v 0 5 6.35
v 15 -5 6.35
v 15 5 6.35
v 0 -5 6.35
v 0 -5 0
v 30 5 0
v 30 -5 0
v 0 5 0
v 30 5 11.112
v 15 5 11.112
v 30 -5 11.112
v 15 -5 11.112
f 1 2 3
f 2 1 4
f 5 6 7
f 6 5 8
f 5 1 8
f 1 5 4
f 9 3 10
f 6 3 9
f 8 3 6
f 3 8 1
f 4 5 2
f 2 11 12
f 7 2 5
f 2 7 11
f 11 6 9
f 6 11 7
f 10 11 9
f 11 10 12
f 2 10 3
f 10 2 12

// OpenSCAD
// file: ../lib/common.scad
// Shared helpers for the AR turntable part models.
//
// Every part file holds a parameter table P. Each row is:
//   [id, description, value_mm, evidence, display_unit, source_or_how_to_check]
//
// Evidence codes:
//   F  factory document          O  owner report
//   C  community drawing         S  industry standard
//   D  design choice             M  measured for this repository
//   DV derived from cited sources, not yet verified on a part. The source
//      column holds the derivation: the formula, each input with its source,
//      and how to verify. Drawn in blue. Needs a row in TO-CONFIRM.md whose
//      value starts with "Derived:". Change to M once measured.
//   PH placeholder: chosen only so the model has a shape. It is NOT a
//      measurement. Drawn in red. Replace it, and change the code, once it
//      is measured.
//
// Every part file also emits metadata naming the part page, the part, the
// version, the material and the tables it fits, each fit with its evidence:
//   ["part", "parts/counterweight.md"], ["part_name", "Counterweight"],
//   ["version", "XA brass weight, 1961 to 1979"], ["material", "Brass"],
//   ["fits", [["XA", "Fitted by AR", "XA service manual p. 4"], ["XB", "Unconfirmed", ""]]]
// The fit word is one of: Fitted by AR, Fits, Fits with a change, Does not
// fit, Unconfirmed. build.py prints these in the title block and writes the
// drawings table of cad/README.md from them.
// License: CC BY-SA 4.0. See LICENSE at the repository root.

IN = 25.4;      // one inch, in mm. All model geometry is in mm.
EPS = 0.01;     // overlap so boolean cuts do not leave zero-thickness skins
$fa = 2;
$fs = 0.1;

// Value of parameter `id` in table t.
function pv(t, id) = t[search([id], t)[0]][2];

// Print part data for cad/tools/build.py, which reads it from the console.
module emit(meta, params, dims = []) {
    echo(META = meta);
    for (row = params) echo(PARAM = row);
    for (row = dims) echo(DIM = row);
}

// Rounded rectangle prism: centered in XY, from z = 0 to z = h.
module rr_prism(l, w, h, r) {
    translate([-l / 2 + r, -w / 2, 0]) cube([l - 2 * r, w, h]);
    translate([-l / 2, -w / 2 + r, 0]) cube([l, w - 2 * r, h]);
    for (sx = [-1, 1], sy = [-1, 1])
        translate([sx * (l / 2 - r), sy * (w / 2 - r), 0]) cylinder(r = r, h = h);
}

// Slot along X: `c` is the distance between end-radius centers.
module slot_prism(c, w, h) {
    translate([-c / 2, -w / 2, 0]) cube([c, w, h]);
    for (sx = [-1, 1]) translate([sx * c / 2, 0, 0]) cylinder(d = w, h = h);
}
// main file
// Cueing height gauge, XB: two steps that check how far the lift raises the stylus.
//
// Drawing 119, note 7: with the mat and one record on, the cueing lift raises
// the stylus 1/4 to 7/16 in above the record. The stylus must clear the low
// step and not the high step.
// Parameter IDs match TO-CONFIRM.md.
// License: CC BY-SA 4.0. See LICENSE at the repository root.
include <../lib/common.scad>

variant = 1;
flat = false;

P = [
    ["CG1", "Low step: the raised stylus must clear it", 1 / 4 * IN, "F", "in", "XB drawing 119, note 7"],
    ["CG2", "High step: the raised stylus must not clear it", 7 / 16 * IN, "F", "in", "XB drawing 119, note 7"],
    ["CG3", "Step length, each", 15, "D", "mm", "Design choice"],
    ["CG4", "Block width", 10, "D", "mm", "Design choice: narrow, so it sits on the record under the stylus"],
    ["CG5", "Base thickness under the steps", 0, "D", "mm", "None: the block stands on the record, so the steps are the heights above the record"],
];

lo = pv(P, "CG1");
hi = pv(P, "CG2");
sl = pv(P, "CG3");
w = pv(P, "CG4");

module part() {
    translate([0, -w / 2, 0]) cube([sl + EPS, w, lo]);
    translate([sl, -w / 2, 0]) cube([sl, w, hi]);
}

emit(
    [
        ["id", "cueing-height-gauge-xb-plastic"],
        ["title", "Cueing height gauge, XB"],
        ["status", "GEOMETRY COMPLETE"],
        ["part", "parts/cueing-height-gauge.md"],
        ["part_name", "Cueing height gauge"],
        ["version", "XB: steps at 1/4 and 7/16 in"],
        ["scope", "New setup tool from the XB factory setting. AR supplied no such gauge"],
        ["material", "Rigid plastic, printed or milled. Soft enough not to chip a stylus if touched"],
        ["density", 1.2],
        ["fits", [["XB", "Fits", "drawing 119, note 7"],
                  ["XA", "Does not fit", "the XA has no cueing lever: model guide"],
                  ["AR77XB", "Unconfirmed", ""]]],
        ["make", "Print or mill. Check both heights with calipers before use"],
        ["views", ["front", "top", "right", "iso"]],
        ["notes", [
            "Use: mat and one record on. Lift the arm with the cueing lever and swing it over the gauge standing on the record. The stylus must pass over the 1/4 in step and must not pass over the 7/16 in step.",
            "Keep the stylus clear of the block. Move the gauge, not the arm, when checking.",
            "Note 8 on the same drawing: the descent from full height to the record takes 1 to 3 seconds.",
        ]],
    ],
    P,
    [
        ["front", "v", [sl, 0, 0], [sl, 0, lo], -9, "CG1"],
        ["front", "v", [2 * sl, 0, 0], [2 * sl, 0, hi], 9, "CG2"],
        ["front", "h", [0, 0, 0], [sl, 0, 0], -9, "CG3"],
        ["top", "v", [2 * sl, -w / 2, 0], [2 * sl, w / 2, 0], 9, "CG4"],
    ]
);

if (flat) projection() part(); else part();
